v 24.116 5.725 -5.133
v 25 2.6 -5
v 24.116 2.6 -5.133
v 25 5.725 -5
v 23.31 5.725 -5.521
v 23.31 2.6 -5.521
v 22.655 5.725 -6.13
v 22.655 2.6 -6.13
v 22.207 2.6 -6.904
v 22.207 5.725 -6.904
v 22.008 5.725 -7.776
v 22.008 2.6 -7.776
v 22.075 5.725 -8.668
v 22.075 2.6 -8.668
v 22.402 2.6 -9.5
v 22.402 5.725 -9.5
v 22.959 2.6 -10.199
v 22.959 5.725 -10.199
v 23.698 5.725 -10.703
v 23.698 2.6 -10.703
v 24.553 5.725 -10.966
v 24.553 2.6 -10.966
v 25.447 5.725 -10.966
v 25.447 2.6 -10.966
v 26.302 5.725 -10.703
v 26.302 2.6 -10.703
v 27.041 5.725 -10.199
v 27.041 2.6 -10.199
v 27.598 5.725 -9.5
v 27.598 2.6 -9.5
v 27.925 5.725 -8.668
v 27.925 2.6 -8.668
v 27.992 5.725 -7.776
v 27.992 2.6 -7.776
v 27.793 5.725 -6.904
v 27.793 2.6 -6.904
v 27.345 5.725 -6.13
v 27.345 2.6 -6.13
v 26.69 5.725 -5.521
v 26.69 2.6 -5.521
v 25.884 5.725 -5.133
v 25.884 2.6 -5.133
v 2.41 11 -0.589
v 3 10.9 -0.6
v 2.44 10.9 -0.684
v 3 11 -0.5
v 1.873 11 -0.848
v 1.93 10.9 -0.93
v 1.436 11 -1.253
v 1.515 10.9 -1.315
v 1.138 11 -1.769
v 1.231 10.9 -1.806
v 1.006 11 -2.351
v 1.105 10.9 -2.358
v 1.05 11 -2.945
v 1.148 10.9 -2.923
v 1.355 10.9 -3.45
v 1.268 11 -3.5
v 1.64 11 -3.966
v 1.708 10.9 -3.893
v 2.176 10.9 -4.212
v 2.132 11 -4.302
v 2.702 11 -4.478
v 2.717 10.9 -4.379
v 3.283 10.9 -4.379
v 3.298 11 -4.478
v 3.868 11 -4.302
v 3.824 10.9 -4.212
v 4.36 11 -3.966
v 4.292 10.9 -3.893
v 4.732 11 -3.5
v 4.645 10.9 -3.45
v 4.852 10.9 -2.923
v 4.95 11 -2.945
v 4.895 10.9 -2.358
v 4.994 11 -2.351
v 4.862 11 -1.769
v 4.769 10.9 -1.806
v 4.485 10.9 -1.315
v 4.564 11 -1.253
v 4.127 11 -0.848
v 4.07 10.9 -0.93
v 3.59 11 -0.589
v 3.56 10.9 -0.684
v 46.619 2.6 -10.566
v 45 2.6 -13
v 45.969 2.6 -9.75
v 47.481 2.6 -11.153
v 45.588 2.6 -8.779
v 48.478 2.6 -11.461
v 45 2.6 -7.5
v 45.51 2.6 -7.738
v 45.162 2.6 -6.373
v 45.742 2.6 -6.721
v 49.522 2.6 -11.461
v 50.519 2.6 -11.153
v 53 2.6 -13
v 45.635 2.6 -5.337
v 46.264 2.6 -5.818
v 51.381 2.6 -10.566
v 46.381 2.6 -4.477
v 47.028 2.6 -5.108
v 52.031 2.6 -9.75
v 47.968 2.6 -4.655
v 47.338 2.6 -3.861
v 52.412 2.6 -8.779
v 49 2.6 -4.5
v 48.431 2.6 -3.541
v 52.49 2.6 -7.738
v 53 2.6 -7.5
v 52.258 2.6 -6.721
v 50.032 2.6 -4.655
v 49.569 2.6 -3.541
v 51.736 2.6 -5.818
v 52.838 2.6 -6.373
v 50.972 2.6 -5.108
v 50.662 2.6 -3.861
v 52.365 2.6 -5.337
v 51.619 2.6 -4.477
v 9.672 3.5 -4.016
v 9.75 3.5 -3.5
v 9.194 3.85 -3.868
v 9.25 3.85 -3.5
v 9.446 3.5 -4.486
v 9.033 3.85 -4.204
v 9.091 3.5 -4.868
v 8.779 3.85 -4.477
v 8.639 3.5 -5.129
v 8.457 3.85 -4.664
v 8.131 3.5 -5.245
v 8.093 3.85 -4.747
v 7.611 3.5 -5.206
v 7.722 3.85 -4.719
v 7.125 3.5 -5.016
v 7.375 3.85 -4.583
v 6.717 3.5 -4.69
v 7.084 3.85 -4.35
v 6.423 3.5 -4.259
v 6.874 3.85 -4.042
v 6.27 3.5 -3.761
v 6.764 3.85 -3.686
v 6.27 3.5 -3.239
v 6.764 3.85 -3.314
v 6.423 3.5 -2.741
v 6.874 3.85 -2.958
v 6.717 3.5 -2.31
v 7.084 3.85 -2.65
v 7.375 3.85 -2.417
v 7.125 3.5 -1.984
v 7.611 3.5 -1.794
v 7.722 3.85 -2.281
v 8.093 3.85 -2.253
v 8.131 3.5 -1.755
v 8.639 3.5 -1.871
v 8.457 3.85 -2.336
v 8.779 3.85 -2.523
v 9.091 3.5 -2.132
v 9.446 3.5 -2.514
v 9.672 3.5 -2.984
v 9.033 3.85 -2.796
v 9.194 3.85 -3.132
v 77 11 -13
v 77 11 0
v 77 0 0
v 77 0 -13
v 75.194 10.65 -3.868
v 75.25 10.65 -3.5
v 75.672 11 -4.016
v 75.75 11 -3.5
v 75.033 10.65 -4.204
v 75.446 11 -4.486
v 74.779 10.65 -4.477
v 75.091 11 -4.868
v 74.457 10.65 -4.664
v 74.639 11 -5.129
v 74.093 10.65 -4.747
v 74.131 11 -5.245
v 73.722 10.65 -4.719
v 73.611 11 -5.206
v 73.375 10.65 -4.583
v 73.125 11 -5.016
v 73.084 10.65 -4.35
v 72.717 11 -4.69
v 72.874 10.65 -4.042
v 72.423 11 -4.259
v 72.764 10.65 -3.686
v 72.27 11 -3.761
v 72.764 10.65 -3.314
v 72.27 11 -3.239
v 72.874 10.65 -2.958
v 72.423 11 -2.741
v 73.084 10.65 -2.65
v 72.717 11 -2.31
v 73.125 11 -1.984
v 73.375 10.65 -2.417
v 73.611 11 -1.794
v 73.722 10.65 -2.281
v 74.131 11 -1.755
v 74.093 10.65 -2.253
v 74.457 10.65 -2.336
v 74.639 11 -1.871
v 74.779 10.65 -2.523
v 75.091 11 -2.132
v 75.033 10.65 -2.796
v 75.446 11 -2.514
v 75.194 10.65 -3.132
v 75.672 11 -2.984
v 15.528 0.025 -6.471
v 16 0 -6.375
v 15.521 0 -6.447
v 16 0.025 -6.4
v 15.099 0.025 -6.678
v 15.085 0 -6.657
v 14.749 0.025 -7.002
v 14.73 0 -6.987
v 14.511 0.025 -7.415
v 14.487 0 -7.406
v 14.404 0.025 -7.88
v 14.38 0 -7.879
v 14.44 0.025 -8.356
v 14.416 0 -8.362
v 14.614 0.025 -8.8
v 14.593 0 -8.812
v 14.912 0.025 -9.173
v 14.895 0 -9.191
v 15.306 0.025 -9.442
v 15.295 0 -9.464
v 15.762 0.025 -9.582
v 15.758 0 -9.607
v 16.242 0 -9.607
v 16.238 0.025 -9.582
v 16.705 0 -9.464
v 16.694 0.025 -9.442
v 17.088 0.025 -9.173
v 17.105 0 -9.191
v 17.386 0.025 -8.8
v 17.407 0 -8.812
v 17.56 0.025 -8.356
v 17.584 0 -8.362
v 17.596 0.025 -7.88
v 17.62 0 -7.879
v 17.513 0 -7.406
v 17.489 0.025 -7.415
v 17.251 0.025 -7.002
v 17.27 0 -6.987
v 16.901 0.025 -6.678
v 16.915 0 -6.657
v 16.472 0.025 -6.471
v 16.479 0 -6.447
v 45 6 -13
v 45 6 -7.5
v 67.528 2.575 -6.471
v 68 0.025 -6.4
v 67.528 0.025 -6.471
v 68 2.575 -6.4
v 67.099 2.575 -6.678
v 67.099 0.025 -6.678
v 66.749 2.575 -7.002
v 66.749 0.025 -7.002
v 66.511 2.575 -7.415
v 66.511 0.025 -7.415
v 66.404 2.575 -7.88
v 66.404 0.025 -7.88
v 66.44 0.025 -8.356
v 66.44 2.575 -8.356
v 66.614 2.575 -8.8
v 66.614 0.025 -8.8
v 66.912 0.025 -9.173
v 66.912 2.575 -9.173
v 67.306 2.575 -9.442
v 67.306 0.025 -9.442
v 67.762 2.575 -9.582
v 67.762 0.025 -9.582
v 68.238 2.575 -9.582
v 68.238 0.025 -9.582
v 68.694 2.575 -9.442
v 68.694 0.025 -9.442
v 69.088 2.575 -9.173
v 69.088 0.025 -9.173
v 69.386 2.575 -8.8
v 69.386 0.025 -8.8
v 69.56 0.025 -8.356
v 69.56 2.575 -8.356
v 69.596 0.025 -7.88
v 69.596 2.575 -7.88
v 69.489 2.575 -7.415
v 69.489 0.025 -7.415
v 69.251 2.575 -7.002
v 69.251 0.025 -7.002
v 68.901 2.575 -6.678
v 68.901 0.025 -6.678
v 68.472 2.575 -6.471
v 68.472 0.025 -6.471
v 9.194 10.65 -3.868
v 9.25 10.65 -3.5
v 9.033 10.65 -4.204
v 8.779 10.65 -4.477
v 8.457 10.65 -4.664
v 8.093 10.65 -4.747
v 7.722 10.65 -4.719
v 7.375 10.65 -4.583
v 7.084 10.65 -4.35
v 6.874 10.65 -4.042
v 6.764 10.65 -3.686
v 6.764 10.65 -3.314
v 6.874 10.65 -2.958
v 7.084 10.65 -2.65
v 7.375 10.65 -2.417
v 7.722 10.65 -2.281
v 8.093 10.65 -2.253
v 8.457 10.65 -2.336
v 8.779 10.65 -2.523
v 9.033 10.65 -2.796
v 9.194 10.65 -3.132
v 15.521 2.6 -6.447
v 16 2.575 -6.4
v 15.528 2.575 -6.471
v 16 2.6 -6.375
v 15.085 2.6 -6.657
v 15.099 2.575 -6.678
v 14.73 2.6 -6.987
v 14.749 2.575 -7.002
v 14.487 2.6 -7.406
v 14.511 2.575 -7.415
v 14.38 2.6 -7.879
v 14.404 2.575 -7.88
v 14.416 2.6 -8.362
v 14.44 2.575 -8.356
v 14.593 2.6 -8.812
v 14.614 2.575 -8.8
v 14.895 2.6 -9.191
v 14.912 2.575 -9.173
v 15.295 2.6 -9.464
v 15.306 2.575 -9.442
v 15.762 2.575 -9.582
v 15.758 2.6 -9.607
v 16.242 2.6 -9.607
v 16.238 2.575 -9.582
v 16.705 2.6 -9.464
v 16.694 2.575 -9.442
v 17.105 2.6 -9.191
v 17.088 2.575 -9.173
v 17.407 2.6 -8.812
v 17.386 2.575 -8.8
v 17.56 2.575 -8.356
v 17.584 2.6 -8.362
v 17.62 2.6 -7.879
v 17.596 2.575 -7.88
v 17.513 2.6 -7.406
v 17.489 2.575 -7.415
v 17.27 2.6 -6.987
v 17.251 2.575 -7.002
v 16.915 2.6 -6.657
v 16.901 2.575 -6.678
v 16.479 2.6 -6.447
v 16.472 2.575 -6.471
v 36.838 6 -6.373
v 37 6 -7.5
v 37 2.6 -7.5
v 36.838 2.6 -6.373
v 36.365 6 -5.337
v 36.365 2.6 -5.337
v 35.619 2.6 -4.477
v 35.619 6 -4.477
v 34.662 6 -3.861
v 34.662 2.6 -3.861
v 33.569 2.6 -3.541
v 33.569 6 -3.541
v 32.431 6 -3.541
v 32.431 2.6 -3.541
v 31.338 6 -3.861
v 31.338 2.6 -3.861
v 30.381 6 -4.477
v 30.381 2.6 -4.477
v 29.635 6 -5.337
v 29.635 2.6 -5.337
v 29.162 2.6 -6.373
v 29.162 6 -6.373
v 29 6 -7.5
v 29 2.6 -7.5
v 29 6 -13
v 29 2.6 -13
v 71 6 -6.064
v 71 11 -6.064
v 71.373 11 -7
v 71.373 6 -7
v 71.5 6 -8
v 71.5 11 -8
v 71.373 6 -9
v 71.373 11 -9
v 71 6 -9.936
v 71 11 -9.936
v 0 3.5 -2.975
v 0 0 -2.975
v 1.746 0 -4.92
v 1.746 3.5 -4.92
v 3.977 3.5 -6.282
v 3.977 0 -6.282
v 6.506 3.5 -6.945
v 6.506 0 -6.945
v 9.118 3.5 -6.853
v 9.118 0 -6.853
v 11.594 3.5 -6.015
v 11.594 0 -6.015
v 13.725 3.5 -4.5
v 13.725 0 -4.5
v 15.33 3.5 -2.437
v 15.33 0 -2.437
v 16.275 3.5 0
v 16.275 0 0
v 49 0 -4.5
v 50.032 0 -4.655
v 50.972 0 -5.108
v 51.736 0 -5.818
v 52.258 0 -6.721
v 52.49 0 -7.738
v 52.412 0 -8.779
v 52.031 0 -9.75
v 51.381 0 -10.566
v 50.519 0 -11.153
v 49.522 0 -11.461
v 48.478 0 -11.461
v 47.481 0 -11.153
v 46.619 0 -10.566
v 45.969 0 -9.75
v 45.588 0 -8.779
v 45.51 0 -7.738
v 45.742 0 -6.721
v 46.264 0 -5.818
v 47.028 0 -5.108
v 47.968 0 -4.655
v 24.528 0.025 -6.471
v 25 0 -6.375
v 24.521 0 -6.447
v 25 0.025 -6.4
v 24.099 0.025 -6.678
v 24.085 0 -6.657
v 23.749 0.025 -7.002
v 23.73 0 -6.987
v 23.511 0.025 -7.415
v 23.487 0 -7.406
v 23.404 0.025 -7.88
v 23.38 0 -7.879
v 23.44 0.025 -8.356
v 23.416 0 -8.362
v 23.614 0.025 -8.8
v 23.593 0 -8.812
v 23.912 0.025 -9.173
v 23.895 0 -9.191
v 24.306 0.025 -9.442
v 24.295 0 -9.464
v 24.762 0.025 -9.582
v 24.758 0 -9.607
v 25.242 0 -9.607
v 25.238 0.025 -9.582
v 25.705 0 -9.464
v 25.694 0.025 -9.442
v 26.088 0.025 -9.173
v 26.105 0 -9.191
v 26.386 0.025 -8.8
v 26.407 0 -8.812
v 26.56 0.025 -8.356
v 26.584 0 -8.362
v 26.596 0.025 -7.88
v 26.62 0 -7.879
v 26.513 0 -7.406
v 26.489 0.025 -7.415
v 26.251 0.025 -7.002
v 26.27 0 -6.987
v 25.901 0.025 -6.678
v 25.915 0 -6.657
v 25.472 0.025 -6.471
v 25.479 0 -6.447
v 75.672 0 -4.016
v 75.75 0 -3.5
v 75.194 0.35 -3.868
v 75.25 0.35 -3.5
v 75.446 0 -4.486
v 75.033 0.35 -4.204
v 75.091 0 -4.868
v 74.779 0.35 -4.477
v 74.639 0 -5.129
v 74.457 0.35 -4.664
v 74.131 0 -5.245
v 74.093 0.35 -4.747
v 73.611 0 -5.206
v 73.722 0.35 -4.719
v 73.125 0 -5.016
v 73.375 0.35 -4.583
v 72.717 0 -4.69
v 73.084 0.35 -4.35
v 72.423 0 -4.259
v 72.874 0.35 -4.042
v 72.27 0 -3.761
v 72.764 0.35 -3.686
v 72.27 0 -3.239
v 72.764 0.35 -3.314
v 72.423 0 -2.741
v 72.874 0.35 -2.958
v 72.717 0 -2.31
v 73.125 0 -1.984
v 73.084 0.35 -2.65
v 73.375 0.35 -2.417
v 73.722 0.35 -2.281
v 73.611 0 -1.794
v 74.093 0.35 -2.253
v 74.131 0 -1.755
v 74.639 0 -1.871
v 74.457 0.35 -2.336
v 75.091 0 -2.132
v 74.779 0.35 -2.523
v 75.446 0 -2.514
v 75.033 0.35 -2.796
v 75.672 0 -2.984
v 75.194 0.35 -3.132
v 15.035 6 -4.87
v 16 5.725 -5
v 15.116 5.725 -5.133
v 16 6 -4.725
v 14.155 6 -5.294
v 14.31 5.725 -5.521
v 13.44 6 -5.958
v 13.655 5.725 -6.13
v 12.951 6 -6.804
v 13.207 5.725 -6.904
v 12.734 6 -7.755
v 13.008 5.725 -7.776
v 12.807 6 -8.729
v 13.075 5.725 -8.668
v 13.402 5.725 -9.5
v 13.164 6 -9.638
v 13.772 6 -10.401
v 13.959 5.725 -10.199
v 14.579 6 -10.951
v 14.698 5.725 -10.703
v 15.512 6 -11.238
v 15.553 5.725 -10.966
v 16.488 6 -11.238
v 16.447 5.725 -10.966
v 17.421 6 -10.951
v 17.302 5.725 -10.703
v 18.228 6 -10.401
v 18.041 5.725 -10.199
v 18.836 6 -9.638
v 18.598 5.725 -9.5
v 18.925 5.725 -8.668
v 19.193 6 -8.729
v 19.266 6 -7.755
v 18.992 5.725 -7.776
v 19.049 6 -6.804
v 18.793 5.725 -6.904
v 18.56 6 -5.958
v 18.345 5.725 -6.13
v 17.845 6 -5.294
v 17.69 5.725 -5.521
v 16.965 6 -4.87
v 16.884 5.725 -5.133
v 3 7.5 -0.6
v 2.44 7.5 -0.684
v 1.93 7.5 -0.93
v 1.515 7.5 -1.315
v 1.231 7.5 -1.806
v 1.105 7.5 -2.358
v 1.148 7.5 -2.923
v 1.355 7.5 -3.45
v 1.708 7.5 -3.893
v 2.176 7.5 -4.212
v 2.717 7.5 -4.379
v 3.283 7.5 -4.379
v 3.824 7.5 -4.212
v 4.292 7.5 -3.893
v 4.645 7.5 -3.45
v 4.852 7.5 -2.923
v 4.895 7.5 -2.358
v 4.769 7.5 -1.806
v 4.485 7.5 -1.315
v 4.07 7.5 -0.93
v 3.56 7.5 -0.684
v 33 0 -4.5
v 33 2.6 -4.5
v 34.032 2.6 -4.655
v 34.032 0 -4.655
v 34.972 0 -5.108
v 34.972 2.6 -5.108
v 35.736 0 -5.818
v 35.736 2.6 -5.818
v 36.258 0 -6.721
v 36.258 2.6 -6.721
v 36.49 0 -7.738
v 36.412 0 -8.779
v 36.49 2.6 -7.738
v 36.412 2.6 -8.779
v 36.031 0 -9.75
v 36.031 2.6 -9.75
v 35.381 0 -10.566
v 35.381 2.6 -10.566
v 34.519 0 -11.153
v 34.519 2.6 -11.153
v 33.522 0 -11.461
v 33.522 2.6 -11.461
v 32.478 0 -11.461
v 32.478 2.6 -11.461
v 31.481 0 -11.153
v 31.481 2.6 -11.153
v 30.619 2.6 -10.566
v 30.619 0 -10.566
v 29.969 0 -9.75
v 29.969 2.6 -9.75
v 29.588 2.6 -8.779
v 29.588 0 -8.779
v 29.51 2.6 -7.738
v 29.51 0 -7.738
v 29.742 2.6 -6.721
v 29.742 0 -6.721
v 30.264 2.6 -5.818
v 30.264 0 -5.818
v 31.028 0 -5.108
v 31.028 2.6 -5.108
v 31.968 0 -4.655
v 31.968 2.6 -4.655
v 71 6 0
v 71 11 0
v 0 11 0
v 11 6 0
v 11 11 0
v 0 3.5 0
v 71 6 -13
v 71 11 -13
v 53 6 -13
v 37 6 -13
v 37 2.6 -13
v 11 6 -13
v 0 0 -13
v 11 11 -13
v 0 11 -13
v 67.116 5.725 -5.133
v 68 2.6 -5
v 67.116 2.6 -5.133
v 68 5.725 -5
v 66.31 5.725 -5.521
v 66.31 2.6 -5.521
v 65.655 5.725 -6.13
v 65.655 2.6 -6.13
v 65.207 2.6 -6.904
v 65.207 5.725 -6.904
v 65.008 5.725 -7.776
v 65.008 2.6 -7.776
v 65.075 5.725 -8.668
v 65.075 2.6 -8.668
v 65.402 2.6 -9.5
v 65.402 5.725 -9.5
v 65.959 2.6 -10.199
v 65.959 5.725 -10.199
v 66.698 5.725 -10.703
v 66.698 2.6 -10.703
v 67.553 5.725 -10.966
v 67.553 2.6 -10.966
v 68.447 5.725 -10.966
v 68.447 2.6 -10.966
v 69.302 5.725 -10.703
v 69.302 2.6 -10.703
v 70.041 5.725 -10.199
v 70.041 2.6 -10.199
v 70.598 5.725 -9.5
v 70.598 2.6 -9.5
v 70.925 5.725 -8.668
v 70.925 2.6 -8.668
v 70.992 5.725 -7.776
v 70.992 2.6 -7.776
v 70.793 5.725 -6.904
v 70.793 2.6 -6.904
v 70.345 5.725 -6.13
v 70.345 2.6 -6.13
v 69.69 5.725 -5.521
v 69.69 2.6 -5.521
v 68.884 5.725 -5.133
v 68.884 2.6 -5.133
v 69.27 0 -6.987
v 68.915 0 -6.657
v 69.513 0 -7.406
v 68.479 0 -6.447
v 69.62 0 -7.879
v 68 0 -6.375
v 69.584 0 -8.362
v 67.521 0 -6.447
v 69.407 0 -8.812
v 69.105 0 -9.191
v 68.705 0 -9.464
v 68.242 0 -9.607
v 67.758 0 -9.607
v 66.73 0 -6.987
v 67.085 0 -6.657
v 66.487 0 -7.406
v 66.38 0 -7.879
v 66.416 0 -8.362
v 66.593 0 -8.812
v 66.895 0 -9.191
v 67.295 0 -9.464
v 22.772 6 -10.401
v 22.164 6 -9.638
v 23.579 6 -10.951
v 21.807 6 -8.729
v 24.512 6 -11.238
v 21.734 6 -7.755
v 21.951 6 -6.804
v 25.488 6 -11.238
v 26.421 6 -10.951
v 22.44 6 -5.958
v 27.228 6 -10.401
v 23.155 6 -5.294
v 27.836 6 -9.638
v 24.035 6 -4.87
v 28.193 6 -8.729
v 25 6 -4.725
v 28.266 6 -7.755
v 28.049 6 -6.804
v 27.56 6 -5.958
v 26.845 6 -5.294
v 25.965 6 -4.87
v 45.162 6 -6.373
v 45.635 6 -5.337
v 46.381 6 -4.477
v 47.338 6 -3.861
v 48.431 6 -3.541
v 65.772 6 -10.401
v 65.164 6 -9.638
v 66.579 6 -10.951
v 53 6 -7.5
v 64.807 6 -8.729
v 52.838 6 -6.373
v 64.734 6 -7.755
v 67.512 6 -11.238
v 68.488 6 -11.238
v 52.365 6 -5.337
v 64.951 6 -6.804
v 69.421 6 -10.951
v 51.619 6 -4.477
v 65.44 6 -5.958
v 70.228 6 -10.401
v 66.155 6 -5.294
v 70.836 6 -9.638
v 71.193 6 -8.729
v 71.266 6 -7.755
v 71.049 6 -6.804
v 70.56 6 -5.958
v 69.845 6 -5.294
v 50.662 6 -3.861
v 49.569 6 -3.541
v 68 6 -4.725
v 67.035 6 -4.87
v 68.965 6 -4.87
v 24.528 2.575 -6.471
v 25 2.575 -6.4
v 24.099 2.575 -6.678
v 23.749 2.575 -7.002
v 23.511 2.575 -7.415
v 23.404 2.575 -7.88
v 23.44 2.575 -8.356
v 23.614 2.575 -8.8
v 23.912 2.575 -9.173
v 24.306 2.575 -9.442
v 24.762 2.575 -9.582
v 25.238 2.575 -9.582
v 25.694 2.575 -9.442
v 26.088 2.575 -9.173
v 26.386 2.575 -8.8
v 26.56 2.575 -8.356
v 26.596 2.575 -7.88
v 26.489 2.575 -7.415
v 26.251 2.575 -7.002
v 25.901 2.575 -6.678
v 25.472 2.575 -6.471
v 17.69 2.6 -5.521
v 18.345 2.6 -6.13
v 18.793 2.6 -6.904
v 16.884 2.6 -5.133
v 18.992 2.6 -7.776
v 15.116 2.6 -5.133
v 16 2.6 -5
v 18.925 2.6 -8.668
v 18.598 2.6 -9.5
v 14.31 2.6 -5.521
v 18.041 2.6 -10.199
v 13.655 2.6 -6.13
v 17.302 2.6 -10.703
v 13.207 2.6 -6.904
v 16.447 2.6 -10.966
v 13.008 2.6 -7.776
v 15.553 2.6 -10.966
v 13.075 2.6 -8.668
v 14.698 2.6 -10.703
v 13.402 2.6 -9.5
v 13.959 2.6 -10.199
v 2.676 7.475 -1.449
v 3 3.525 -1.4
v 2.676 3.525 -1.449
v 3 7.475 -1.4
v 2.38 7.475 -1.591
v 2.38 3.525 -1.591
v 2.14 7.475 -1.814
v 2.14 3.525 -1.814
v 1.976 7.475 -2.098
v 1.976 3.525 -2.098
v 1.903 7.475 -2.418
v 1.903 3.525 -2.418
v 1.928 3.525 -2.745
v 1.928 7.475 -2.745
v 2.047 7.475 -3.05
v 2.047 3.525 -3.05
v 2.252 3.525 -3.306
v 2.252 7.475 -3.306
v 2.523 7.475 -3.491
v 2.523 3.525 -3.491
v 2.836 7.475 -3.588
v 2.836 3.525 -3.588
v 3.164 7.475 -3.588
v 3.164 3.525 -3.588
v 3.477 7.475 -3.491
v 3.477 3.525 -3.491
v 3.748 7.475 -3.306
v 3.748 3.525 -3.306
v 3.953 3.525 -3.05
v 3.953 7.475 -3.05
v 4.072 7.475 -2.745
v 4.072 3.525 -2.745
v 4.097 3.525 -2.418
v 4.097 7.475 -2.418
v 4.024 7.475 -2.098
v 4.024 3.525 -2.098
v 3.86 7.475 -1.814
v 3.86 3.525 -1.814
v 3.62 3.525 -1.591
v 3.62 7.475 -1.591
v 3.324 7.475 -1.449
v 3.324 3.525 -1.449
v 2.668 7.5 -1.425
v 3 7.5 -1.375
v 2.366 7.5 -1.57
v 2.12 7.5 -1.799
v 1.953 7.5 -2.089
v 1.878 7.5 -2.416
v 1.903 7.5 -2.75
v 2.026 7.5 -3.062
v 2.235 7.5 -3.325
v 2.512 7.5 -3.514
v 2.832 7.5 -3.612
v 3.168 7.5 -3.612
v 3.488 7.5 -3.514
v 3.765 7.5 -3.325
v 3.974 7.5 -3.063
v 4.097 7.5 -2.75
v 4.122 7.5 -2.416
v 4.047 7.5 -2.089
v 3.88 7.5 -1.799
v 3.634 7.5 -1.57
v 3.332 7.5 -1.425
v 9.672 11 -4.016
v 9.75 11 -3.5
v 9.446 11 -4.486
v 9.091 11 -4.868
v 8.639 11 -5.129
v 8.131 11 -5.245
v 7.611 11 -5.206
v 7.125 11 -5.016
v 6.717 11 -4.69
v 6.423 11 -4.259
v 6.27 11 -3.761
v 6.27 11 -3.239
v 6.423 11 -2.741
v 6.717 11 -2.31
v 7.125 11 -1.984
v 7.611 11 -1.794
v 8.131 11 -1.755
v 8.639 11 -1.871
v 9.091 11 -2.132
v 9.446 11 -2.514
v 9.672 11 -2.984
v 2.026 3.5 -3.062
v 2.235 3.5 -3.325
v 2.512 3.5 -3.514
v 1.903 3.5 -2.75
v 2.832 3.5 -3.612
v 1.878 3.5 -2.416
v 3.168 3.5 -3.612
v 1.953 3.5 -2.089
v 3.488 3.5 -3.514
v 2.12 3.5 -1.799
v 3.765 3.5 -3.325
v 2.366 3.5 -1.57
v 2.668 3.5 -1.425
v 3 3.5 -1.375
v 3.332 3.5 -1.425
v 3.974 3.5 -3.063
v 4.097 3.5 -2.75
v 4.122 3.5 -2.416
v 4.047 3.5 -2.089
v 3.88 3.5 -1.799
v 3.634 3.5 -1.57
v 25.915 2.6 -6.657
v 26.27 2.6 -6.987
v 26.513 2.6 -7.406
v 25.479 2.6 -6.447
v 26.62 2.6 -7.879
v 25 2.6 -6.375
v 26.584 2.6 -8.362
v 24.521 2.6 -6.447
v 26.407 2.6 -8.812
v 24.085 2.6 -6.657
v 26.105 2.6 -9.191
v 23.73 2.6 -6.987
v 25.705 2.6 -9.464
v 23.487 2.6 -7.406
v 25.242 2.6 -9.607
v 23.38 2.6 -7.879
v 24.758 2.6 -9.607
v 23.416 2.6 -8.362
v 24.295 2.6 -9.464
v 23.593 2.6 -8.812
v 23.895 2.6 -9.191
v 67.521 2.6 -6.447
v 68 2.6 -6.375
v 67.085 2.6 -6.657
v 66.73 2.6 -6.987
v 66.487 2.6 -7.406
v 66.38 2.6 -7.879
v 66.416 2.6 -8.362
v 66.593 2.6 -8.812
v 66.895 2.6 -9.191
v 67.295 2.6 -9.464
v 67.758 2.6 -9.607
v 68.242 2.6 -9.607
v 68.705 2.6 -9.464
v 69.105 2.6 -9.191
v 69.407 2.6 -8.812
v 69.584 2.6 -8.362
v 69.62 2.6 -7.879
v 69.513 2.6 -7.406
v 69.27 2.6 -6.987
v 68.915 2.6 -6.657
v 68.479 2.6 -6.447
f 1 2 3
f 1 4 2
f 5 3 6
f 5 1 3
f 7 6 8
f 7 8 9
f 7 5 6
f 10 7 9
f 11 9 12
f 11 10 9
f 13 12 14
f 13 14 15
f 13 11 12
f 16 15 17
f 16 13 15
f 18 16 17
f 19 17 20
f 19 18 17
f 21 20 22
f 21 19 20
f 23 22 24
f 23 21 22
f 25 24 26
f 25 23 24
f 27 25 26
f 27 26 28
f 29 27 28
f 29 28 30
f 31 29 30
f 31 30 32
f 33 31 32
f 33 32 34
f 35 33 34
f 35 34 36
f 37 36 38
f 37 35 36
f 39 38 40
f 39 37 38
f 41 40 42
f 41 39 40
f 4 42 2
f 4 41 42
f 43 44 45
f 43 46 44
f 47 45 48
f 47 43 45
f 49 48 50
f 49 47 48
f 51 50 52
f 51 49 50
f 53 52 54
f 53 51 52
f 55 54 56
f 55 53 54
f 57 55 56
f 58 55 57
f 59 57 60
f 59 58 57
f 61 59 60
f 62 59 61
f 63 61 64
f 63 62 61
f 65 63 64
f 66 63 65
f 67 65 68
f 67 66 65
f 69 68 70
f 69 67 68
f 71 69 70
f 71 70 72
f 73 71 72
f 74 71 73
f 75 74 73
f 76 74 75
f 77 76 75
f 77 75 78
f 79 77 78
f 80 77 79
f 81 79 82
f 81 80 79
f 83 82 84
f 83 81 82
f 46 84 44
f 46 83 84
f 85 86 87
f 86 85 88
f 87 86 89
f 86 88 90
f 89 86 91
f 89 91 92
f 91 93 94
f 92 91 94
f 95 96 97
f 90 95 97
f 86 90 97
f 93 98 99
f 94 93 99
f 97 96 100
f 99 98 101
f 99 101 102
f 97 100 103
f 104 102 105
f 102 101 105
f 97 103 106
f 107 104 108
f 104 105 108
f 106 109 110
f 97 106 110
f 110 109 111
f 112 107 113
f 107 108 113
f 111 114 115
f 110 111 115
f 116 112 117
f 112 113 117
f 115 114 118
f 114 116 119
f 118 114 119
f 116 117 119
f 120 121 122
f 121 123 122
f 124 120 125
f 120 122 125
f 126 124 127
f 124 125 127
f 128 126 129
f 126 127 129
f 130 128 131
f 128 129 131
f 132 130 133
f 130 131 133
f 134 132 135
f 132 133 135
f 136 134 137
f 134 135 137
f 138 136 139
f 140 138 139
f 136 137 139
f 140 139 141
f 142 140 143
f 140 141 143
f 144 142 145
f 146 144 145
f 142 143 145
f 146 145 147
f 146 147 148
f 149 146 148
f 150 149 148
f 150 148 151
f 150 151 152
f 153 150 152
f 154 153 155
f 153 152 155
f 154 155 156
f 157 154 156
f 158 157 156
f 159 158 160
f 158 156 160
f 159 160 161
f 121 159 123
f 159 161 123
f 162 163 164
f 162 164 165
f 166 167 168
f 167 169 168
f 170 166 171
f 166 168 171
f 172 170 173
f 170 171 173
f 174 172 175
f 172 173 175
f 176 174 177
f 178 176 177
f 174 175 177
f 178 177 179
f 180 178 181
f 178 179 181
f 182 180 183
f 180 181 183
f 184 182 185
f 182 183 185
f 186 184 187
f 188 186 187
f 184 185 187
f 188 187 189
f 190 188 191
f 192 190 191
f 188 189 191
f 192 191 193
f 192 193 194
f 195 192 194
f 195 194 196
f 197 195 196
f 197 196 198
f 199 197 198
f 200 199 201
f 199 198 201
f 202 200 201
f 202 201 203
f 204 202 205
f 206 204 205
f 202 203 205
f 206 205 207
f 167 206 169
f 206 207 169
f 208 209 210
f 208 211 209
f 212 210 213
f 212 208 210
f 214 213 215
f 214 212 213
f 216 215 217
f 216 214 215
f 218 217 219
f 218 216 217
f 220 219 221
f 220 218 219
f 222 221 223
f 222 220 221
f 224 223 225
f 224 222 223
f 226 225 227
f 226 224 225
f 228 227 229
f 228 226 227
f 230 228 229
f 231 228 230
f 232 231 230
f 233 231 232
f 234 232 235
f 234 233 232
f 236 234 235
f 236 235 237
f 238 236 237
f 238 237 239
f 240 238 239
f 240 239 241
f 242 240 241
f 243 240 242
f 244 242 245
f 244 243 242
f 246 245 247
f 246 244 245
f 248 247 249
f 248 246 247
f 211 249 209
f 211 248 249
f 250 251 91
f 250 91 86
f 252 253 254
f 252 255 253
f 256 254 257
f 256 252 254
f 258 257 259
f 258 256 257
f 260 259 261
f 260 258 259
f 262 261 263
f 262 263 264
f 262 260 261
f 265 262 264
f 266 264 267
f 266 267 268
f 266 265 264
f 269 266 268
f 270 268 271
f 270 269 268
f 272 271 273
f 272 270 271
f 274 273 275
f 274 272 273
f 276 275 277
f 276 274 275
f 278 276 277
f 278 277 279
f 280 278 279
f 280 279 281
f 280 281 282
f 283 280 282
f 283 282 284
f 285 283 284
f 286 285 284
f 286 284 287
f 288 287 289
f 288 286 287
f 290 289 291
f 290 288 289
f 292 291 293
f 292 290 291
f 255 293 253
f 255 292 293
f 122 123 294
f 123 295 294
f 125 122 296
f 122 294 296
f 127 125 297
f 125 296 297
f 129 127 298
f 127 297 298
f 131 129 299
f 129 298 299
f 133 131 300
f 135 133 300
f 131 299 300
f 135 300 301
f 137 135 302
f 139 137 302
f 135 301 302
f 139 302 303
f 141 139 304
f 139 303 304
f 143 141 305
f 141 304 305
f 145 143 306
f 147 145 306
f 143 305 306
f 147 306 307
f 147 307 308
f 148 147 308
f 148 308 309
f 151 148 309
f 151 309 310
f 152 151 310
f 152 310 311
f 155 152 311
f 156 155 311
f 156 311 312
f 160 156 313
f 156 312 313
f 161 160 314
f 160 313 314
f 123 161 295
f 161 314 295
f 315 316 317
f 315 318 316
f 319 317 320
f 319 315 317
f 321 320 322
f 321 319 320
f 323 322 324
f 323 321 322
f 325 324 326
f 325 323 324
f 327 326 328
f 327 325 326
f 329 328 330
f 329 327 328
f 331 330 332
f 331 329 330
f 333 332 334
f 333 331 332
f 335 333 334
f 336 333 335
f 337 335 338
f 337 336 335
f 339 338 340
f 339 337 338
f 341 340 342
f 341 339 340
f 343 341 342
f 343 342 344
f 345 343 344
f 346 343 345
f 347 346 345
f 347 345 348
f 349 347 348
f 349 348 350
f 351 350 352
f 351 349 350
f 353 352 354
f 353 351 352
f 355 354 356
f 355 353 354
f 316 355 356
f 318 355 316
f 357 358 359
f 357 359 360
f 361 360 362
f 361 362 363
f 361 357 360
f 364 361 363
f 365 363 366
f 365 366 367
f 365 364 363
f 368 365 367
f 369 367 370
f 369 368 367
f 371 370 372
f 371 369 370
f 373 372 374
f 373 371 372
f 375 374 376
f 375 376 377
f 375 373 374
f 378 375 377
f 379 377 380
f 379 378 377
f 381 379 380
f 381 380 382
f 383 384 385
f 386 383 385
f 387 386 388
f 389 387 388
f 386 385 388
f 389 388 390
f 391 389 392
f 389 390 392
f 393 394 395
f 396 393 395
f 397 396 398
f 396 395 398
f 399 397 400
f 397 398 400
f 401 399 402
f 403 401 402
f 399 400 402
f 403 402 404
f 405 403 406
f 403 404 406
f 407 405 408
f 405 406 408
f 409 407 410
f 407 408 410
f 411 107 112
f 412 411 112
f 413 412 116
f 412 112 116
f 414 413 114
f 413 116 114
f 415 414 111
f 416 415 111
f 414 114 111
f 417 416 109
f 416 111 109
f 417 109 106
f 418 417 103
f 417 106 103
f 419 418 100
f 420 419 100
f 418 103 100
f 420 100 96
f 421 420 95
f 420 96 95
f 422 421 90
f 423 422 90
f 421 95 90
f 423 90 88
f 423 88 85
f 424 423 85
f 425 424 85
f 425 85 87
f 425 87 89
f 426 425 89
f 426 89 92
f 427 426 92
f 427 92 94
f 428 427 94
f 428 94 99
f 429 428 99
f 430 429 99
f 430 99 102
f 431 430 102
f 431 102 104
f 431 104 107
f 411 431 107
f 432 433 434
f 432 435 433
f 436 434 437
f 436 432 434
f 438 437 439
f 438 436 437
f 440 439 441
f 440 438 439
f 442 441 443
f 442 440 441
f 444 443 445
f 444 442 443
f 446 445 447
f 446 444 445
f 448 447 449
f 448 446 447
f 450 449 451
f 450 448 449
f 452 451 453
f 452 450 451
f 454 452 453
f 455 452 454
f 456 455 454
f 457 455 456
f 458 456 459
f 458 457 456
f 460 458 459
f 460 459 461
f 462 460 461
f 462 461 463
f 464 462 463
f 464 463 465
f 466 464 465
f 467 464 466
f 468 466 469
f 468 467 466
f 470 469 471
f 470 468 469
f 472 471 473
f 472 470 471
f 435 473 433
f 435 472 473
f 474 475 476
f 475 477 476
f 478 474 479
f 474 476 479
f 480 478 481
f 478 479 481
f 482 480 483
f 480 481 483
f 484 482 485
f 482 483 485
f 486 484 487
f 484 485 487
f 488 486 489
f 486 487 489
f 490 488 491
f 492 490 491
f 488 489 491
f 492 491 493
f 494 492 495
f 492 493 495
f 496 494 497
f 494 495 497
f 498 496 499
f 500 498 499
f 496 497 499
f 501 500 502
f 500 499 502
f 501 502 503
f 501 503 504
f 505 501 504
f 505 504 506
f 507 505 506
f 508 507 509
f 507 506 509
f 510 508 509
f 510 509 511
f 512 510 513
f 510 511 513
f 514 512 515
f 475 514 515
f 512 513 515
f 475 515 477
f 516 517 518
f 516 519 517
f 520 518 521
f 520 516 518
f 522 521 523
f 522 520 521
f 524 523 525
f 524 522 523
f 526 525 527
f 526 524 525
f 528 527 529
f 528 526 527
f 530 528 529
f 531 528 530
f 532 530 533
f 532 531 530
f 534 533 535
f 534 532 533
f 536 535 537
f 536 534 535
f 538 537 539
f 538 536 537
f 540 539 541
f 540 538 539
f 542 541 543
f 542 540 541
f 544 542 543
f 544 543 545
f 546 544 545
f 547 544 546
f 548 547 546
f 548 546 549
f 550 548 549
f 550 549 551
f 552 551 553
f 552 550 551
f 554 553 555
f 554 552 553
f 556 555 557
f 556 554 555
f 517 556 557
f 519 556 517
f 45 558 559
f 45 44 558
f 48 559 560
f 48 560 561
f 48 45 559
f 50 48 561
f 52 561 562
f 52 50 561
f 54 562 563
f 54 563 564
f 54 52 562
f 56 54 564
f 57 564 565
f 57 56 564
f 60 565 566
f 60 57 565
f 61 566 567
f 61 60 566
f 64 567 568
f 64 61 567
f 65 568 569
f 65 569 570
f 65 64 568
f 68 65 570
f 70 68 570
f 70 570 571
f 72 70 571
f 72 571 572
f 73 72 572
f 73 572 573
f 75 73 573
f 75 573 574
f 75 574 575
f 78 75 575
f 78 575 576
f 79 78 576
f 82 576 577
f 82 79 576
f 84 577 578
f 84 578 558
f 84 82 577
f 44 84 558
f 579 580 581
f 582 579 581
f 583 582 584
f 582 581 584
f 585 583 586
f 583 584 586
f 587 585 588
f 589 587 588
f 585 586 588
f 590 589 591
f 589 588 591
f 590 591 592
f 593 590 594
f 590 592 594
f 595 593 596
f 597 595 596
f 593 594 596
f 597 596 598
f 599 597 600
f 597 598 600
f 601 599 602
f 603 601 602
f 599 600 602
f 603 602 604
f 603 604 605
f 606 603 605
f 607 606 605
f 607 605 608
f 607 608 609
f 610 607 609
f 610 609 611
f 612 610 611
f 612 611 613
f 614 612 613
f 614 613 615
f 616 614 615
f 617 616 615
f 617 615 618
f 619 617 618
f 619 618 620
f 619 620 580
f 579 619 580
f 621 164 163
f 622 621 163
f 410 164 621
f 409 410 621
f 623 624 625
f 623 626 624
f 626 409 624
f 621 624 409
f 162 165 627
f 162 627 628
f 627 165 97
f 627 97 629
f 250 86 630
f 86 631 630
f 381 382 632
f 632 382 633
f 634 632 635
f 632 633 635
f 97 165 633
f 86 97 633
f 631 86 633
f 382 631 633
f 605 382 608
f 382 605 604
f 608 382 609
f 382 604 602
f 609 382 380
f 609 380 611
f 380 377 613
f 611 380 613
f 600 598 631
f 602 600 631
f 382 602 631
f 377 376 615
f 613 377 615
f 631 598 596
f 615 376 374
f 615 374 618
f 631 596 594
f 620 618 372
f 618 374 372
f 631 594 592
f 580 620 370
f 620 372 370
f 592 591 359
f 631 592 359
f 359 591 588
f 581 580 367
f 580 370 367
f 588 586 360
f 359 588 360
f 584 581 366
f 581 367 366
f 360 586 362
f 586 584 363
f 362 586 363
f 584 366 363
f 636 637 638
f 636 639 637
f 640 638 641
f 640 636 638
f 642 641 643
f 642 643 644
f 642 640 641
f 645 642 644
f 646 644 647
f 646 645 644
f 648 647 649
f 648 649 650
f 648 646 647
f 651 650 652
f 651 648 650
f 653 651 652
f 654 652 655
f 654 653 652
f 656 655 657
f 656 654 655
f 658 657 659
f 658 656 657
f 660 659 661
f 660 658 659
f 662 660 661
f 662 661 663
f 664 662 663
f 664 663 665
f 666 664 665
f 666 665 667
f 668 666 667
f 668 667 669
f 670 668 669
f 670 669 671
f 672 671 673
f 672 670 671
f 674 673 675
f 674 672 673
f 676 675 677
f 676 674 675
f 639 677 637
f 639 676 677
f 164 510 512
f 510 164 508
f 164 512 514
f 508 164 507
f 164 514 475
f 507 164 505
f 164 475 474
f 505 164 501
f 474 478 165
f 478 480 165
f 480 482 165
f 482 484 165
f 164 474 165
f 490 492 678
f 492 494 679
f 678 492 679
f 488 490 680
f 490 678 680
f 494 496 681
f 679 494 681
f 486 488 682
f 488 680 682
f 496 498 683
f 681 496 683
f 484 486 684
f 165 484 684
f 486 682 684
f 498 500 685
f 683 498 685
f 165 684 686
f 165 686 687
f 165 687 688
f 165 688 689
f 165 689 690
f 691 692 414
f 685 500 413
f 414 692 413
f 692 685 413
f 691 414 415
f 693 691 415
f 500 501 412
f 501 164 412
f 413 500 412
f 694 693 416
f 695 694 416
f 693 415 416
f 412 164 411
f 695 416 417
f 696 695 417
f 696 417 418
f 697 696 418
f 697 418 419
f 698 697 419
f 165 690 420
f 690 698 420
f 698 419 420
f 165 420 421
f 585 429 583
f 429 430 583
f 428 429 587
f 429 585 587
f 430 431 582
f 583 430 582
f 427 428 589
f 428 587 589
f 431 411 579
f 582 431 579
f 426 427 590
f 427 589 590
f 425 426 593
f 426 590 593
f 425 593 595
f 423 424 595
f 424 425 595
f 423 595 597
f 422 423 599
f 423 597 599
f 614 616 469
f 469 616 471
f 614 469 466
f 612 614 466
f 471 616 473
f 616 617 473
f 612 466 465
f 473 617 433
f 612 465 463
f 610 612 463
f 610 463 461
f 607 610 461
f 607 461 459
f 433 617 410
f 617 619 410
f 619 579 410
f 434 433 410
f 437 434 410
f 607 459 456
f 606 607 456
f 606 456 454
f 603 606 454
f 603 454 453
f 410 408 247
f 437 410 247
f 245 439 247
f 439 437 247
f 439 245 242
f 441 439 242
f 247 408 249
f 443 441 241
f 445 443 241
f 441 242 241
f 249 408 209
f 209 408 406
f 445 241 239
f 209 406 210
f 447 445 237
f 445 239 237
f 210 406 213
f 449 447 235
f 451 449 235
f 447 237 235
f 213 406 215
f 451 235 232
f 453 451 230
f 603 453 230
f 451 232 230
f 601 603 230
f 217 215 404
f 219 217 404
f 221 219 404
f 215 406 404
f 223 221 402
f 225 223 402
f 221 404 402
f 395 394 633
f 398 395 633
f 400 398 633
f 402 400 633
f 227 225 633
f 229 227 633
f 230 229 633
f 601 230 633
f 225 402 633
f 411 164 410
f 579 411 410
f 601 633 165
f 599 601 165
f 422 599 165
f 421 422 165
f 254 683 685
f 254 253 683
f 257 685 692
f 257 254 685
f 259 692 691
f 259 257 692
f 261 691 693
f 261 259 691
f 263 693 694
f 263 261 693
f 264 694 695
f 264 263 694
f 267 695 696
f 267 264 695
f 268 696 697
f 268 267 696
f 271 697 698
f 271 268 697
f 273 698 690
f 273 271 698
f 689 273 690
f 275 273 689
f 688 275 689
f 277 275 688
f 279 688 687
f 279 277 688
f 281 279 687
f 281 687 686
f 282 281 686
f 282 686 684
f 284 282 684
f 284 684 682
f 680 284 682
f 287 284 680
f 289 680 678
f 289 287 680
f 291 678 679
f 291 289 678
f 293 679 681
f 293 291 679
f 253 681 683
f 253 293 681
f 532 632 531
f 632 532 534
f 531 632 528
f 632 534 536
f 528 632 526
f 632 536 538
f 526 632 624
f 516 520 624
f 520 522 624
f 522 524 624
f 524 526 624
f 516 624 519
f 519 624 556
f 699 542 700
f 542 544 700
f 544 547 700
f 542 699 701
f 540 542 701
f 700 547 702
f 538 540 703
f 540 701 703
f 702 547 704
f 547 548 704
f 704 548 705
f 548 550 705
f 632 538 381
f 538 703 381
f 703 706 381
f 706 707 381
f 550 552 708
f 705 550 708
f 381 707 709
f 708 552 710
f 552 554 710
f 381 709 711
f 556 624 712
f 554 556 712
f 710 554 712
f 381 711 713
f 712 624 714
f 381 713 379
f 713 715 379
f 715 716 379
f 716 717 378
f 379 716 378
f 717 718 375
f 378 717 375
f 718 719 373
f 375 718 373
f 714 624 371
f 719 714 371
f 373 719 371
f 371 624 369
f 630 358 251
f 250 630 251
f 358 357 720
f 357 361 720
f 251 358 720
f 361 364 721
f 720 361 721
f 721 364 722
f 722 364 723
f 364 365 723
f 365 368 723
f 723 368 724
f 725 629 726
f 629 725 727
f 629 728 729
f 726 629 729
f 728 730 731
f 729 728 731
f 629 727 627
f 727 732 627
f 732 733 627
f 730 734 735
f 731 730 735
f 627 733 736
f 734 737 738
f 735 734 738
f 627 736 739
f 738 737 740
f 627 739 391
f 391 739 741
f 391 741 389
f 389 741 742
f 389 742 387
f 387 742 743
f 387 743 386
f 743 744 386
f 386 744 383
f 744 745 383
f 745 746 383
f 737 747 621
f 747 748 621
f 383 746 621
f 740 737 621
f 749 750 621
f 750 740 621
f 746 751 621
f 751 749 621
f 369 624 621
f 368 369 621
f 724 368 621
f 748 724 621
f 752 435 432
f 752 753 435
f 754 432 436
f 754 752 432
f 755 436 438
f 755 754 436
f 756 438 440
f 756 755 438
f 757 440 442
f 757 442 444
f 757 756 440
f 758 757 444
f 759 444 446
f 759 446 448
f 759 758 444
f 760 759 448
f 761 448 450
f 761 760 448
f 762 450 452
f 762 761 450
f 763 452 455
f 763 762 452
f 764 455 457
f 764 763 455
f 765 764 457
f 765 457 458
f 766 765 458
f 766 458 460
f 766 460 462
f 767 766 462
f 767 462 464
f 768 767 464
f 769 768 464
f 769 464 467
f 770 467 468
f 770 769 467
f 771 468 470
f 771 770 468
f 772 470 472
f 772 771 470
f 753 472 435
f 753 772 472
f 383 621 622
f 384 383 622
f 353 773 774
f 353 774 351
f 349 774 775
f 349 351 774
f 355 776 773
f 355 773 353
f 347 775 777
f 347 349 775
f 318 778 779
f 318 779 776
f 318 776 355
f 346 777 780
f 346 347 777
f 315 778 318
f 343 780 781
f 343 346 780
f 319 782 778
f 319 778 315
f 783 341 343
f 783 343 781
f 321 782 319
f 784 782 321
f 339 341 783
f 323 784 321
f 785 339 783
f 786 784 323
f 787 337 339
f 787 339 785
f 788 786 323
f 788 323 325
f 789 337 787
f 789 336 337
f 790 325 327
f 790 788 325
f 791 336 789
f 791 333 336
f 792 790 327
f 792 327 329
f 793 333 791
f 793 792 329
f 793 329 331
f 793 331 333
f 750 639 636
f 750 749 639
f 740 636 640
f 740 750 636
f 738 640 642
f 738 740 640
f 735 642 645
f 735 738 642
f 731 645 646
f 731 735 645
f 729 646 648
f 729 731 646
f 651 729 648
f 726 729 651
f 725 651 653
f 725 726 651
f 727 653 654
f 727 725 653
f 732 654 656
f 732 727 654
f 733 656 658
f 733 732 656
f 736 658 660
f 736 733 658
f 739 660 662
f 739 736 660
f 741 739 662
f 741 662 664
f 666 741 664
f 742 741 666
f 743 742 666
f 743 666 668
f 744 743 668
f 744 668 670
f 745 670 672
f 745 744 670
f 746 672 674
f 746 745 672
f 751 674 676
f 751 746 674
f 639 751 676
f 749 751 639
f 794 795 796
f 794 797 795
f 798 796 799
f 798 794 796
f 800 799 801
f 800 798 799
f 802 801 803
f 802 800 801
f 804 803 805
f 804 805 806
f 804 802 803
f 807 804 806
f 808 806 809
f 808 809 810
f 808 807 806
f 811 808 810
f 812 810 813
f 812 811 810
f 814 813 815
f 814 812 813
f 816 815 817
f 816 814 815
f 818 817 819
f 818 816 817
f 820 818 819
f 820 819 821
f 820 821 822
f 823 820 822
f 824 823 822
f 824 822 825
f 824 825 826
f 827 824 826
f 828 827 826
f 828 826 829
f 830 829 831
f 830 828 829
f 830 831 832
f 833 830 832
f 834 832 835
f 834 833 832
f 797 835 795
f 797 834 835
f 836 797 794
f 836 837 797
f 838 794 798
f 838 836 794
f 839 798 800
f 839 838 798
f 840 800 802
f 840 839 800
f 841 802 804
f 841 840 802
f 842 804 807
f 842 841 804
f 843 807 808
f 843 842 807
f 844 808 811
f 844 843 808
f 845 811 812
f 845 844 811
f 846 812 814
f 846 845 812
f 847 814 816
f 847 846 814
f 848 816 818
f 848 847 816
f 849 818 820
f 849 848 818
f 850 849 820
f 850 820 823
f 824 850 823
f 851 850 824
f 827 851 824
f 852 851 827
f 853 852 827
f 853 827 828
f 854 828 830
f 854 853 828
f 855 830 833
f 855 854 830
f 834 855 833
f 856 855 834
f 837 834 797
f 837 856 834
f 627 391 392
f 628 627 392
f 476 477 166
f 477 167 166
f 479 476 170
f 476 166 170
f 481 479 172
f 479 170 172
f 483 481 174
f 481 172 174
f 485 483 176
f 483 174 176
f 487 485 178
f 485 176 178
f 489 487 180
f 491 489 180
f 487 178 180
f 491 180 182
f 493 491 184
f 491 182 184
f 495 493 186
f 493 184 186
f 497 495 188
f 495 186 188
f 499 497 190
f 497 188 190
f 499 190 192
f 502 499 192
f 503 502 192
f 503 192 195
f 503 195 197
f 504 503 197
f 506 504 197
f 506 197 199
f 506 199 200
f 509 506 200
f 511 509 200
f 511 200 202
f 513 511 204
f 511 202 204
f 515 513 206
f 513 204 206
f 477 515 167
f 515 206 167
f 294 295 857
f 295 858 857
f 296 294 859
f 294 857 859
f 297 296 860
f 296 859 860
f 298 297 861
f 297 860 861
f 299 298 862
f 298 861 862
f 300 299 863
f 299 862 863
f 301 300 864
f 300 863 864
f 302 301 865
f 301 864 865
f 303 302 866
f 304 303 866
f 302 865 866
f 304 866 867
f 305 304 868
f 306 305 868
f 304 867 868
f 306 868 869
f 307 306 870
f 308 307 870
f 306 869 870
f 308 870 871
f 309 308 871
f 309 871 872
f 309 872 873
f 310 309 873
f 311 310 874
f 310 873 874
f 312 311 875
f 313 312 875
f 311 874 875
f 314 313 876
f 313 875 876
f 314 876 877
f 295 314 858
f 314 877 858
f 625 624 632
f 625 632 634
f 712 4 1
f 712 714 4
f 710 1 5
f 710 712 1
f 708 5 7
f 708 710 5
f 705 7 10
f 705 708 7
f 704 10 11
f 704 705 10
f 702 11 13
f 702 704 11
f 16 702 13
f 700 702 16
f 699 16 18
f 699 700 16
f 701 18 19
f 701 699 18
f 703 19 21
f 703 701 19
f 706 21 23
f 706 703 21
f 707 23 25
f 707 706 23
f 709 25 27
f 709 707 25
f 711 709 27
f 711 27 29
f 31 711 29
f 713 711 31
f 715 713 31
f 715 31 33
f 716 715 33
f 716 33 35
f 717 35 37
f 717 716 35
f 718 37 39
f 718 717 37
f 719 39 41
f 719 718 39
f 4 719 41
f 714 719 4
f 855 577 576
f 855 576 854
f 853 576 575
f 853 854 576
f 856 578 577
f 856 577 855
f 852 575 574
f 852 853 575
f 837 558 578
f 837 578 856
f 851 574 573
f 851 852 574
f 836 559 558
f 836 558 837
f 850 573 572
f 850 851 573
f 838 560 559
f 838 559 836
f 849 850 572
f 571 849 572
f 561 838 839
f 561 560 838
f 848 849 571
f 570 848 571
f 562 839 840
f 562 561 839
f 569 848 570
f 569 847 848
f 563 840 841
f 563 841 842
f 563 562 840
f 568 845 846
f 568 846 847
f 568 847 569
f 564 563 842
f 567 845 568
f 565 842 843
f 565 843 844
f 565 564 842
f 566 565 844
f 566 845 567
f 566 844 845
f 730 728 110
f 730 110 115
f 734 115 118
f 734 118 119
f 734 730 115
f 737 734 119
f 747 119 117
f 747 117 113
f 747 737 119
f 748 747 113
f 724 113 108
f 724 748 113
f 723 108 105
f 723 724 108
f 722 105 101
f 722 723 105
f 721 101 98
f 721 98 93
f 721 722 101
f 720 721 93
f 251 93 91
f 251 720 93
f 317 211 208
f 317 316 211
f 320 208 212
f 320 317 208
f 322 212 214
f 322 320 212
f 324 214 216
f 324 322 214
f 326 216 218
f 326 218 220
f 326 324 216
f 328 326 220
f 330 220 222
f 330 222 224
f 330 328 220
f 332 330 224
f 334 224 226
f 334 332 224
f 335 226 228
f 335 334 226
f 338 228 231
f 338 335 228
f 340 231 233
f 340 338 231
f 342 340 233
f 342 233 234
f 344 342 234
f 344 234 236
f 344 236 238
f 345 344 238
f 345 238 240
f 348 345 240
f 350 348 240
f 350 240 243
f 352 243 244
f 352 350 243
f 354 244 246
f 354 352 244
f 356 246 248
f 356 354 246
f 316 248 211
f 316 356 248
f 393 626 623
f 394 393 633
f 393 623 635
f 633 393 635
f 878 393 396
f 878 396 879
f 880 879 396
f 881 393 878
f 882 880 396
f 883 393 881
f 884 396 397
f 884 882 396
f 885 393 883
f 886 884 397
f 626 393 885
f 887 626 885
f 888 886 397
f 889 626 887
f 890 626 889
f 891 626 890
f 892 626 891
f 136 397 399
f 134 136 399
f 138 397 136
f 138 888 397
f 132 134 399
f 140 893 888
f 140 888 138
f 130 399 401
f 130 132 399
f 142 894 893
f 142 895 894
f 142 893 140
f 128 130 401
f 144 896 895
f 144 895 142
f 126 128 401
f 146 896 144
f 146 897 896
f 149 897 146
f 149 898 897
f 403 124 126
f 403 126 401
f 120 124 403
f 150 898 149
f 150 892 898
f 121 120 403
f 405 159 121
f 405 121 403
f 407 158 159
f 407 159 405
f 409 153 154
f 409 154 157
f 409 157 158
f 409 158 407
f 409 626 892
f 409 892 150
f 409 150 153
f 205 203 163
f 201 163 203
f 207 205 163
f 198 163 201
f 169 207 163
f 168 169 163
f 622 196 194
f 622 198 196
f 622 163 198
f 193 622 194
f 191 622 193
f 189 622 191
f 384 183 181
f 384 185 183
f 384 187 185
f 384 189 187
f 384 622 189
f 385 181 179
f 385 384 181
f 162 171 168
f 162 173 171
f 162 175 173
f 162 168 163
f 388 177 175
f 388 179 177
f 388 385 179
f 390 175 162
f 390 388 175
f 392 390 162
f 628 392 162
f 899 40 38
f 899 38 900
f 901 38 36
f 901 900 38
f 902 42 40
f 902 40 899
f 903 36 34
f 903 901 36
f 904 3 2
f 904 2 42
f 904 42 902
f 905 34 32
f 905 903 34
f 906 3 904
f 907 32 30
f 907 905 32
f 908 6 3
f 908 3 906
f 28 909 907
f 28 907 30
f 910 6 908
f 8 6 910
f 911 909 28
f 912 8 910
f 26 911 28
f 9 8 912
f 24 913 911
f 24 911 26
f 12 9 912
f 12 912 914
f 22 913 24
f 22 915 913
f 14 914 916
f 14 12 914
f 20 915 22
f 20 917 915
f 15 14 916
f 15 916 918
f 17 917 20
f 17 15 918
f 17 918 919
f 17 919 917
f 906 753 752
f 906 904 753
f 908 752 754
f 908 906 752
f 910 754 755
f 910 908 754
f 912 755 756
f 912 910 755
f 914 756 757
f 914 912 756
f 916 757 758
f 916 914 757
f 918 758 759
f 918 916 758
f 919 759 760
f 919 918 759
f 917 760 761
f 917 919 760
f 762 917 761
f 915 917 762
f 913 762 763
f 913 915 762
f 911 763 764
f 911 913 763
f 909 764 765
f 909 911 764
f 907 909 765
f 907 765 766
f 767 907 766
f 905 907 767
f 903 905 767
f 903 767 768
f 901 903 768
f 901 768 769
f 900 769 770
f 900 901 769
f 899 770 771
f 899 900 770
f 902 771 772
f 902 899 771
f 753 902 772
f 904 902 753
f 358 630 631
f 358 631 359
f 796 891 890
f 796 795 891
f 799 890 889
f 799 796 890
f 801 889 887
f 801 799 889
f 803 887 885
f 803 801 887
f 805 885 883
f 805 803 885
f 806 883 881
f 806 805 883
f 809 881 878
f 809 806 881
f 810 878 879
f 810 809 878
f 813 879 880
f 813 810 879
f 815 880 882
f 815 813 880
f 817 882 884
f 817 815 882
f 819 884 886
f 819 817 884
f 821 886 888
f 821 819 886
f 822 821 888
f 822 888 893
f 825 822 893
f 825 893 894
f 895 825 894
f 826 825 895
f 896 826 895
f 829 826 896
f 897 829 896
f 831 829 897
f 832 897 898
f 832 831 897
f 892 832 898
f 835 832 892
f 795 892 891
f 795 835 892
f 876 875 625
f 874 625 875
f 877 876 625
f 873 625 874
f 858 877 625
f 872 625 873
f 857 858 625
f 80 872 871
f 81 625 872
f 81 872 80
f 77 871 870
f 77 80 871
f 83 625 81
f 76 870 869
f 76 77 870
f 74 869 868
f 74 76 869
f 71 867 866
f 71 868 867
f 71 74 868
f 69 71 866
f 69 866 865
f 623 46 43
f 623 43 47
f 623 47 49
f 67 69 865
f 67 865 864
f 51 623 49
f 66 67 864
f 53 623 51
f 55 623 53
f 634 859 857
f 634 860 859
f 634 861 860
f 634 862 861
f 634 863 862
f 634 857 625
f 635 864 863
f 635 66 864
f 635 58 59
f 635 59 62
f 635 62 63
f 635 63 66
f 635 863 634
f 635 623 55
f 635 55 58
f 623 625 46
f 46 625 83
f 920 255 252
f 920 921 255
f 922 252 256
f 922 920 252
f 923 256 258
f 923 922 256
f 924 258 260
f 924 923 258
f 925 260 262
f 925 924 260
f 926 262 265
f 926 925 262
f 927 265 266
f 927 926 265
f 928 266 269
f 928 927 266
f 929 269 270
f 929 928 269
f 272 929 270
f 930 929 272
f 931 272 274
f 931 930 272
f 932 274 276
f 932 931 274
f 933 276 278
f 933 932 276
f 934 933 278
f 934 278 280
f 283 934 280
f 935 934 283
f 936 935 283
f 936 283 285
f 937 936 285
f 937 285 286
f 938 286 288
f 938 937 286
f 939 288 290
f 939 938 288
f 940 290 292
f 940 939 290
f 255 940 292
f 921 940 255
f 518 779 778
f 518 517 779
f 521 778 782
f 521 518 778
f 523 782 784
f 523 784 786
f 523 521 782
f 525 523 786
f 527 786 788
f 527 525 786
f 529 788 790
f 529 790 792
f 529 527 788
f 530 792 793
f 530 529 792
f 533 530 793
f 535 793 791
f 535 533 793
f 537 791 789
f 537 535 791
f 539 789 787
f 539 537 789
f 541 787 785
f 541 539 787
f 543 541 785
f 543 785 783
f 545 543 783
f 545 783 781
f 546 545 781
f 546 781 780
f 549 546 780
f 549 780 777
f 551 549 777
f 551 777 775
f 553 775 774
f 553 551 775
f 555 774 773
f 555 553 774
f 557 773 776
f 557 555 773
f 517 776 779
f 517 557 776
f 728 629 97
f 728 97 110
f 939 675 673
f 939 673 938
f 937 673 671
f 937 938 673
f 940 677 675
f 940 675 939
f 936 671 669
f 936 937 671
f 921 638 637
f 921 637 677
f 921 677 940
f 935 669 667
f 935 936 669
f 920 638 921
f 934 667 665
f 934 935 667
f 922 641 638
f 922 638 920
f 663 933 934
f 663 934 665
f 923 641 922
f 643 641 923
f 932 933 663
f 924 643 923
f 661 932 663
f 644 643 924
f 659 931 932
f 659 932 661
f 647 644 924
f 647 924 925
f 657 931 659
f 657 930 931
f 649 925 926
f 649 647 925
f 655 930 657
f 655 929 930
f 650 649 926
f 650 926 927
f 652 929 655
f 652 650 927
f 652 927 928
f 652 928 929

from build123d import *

# Parameters (mm, degrees)
SKETCH_1_W                 = 13
SKETCH_1_H                 = 11
EXTRUDE_1_DEPTH            = 77
SKETCH_2_W                 = 60
SKETCH_2_H                 = 5
CUT_EXTRUDE_1_DEPTH        = 79.860636569
CUT_EXTRUDE_2_DEPTH        = 5
HOLE_WIZARD_M31_AT_2_COUNT = 2
HOLE_WIZARD_M31_AT_2_PITCH = 52
HOLE_WIZARD_M31_AT_3_COUNT = 2
HOLE_WIZARD_M31_AT_3_PITCH = 9
CUT_EXTRUDE_3_DEPTH        = 3.5
CUT_EXTRUDE_5_DEPTH        = 3.4
SKETCH_12_R                = 3.5
CUT_EXTRUDE_6_DEPTH        = 10


# Read off the part's stored shape, not the designer's step: Отверстие обработанное метчиком M32
with BuildPart() as part:
    # Эскиз1 → Бобышка-Вытянуть1 (new body)
    with BuildSketch(Plane(origin=(0, 0, 0), x_dir=(0, 0, -1), z_dir=(1, 0, 0))):
        with Locations((6.5, 5.5)):
            Rectangle(SKETCH_1_W, SKETCH_1_H)
    extrude(amount=EXTRUDE_1_DEPTH)

    # Эскиз2 → Вырез-Вытянуть1 (cut, through all)
    with BuildSketch(Plane.XY):
        with Locations((41, 8.5)):
            Rectangle(SKETCH_2_W, SKETCH_2_H)
    extrude(amount=-CUT_EXTRUDE_1_DEPTH, mode=Mode.SUBTRACT)

    # Эскиз5 → Вырез-Вытянуть2 (cut)
    with BuildSketch(Plane(origin=(0, 11, 0), x_dir=(1, 0, 0), z_dir=(0, 1, 0))):
        with BuildLine():
            ThreePointArc((71, 6.063508327), (71.5, 8), (71, 9.936491673))
            Line((71, 9.936491673), (71, 6.063508327))
        make_face()
    extrude(amount=-CUT_EXTRUDE_2_DEPTH, mode=Mode.SUBTRACT)

    # Эскиз3 → Цековка для винта с внутренним шестигранником M31 (revolve, cut)
    with BuildSketch(Plane(origin=(16, 6, -8), x_dir=(0, 0, 1), z_dir=(1, 0, 0))):
        Polygon((0, 0), (0, 6), (1.625, 6), (1.6, 5.975), (1.6, 3.425), (1.625, 3.4), (3, 3.4), (3, 0.275), (3.275, 0), align=None)
    hole_wizard_m31 = revolve(axis=Axis((16, 12.35, -8), (0, -1, 0)), mode=Mode.SUBTRACT)

    # Цековка для винта с внутренним шестигранником M31 at 2: Цековка для винта с внутренним шестигранником M31 ×2
    with Locations(*[(i * HOLE_WIZARD_M31_AT_2_PITCH, 0, 0) for i in range(1, HOLE_WIZARD_M31_AT_2_COUNT)]):
        add(hole_wizard_m31, mode=Mode.SUBTRACT)

    # Цековка для винта с внутренним шестигранником M31 at 3: Цековка для винта с внутренним шестигранником M31 ×2
    with Locations(*[(i * HOLE_WIZARD_M31_AT_3_PITCH, 0, 0) for i in range(1, HOLE_WIZARD_M31_AT_3_COUNT)]):
        add(hole_wizard_m31, mode=Mode.SUBTRACT)

    # Эскиз8 → Вырез-Вытянуть3 (cut)
    with BuildSketch(Plane.XZ):
        with BuildLine():
            ThreePointArc((0, -2.974937186), (9.118315903, -6.853307497), (16.274964387, 0))
            Line((16.274964387, 0), (0, 0))
            Line((0, 0), (0, -2.974937186))
        make_face()
    extrude(amount=-CUT_EXTRUDE_3_DEPTH, mode=Mode.SUBTRACT)

    # Эскиз9 → Вырез-Вытянуть5 (cut)
    with BuildSketch(Plane.XZ.offset(-6)):
        with BuildLine():
            ThreePointArc((37, -7.5), (33, -3.5), (29, -7.5))
            Line((29, -7.5), (29, -13))
            Line((29, -13), (37, -13))
            Line((37, -13), (37, -7.5))
        make_face()
        with BuildLine():
            Line((45, -7.5), (45, -13))
            Line((45, -13), (53, -13))
            Line((53, -13), (53, -7.5))
            ThreePointArc((53, -7.5), (49, -3.5), (45, -7.5))
        make_face()
    extrude(amount=CUT_EXTRUDE_5_DEPTH, mode=Mode.SUBTRACT)

    # Отверстие обработанное метчиком M32 outline → Отверстие обработанное метчиком M32 (revolve, cut)
    with BuildSketch(Plane(origin=(74, 0, -3.5), x_dir=(1, 0, 0), z_dir=(0, 0, 1))):
        Polygon((0, 0), (1.75, 0), (1.25, 0.350103769), (1.25, 10.649896231), (1.75, 11), (0, 11), align=None)
    revolve(axis=Axis((74, 0, -3.5), (0, 1, 0)), mode=Mode.SUBTRACT)

    # Hole Wizard M32 2 outline → Hole Wizard M32 2 (revolve, cut)
    with BuildSketch(Plane(origin=(8, 0, -3.5), x_dir=(1, 0, 0), z_dir=(0, 0, 1))):
        Polygon((0, 3.5), (1.75, 3.5), (1.25, 3.850103769), (1.25, 10.649896231), (1.75, 11), (0, 11), align=None)
    revolve(axis=Axis((8, 0, -3.5), (0, 1, 0)), mode=Mode.SUBTRACT)

    # Эскиз10 → Цековка для винта с внутренним шестигранником M21 (revolve, cut)
    with BuildSketch(Plane(origin=(3, 11, -2.5), x_dir=(0, 0, 1), z_dir=(1, 0, 0))):
        Polygon((0, 0), (0, 7.5), (1.125, 7.5), (1.1, 7.475), (1.1, 3.525), (1.125, 3.5), (1.9, 3.5), (1.9, 0.1), (2, 0), align=None)
    revolve(axis=Axis((3, 17.35, -2.5), (0, -1, 0)), mode=Mode.SUBTRACT)

    # Эскиз12 → Вырез-Вытянуть6 (cut)
    with BuildSketch(Plane(origin=(0, 6, 0), x_dir=(1, 0, 0), z_dir=(0, 1, 0))):
        with Locations(Location((33, 8, 0), (0, 0, 270))):
            Circle(SKETCH_12_R)
        with Locations(Location((49, 8, 0), (0, 0, 270))):
            Circle(SKETCH_12_R)
    extrude(amount=-CUT_EXTRUDE_6_DEPTH, mode=Mode.SUBTRACT)


solid = part.part
